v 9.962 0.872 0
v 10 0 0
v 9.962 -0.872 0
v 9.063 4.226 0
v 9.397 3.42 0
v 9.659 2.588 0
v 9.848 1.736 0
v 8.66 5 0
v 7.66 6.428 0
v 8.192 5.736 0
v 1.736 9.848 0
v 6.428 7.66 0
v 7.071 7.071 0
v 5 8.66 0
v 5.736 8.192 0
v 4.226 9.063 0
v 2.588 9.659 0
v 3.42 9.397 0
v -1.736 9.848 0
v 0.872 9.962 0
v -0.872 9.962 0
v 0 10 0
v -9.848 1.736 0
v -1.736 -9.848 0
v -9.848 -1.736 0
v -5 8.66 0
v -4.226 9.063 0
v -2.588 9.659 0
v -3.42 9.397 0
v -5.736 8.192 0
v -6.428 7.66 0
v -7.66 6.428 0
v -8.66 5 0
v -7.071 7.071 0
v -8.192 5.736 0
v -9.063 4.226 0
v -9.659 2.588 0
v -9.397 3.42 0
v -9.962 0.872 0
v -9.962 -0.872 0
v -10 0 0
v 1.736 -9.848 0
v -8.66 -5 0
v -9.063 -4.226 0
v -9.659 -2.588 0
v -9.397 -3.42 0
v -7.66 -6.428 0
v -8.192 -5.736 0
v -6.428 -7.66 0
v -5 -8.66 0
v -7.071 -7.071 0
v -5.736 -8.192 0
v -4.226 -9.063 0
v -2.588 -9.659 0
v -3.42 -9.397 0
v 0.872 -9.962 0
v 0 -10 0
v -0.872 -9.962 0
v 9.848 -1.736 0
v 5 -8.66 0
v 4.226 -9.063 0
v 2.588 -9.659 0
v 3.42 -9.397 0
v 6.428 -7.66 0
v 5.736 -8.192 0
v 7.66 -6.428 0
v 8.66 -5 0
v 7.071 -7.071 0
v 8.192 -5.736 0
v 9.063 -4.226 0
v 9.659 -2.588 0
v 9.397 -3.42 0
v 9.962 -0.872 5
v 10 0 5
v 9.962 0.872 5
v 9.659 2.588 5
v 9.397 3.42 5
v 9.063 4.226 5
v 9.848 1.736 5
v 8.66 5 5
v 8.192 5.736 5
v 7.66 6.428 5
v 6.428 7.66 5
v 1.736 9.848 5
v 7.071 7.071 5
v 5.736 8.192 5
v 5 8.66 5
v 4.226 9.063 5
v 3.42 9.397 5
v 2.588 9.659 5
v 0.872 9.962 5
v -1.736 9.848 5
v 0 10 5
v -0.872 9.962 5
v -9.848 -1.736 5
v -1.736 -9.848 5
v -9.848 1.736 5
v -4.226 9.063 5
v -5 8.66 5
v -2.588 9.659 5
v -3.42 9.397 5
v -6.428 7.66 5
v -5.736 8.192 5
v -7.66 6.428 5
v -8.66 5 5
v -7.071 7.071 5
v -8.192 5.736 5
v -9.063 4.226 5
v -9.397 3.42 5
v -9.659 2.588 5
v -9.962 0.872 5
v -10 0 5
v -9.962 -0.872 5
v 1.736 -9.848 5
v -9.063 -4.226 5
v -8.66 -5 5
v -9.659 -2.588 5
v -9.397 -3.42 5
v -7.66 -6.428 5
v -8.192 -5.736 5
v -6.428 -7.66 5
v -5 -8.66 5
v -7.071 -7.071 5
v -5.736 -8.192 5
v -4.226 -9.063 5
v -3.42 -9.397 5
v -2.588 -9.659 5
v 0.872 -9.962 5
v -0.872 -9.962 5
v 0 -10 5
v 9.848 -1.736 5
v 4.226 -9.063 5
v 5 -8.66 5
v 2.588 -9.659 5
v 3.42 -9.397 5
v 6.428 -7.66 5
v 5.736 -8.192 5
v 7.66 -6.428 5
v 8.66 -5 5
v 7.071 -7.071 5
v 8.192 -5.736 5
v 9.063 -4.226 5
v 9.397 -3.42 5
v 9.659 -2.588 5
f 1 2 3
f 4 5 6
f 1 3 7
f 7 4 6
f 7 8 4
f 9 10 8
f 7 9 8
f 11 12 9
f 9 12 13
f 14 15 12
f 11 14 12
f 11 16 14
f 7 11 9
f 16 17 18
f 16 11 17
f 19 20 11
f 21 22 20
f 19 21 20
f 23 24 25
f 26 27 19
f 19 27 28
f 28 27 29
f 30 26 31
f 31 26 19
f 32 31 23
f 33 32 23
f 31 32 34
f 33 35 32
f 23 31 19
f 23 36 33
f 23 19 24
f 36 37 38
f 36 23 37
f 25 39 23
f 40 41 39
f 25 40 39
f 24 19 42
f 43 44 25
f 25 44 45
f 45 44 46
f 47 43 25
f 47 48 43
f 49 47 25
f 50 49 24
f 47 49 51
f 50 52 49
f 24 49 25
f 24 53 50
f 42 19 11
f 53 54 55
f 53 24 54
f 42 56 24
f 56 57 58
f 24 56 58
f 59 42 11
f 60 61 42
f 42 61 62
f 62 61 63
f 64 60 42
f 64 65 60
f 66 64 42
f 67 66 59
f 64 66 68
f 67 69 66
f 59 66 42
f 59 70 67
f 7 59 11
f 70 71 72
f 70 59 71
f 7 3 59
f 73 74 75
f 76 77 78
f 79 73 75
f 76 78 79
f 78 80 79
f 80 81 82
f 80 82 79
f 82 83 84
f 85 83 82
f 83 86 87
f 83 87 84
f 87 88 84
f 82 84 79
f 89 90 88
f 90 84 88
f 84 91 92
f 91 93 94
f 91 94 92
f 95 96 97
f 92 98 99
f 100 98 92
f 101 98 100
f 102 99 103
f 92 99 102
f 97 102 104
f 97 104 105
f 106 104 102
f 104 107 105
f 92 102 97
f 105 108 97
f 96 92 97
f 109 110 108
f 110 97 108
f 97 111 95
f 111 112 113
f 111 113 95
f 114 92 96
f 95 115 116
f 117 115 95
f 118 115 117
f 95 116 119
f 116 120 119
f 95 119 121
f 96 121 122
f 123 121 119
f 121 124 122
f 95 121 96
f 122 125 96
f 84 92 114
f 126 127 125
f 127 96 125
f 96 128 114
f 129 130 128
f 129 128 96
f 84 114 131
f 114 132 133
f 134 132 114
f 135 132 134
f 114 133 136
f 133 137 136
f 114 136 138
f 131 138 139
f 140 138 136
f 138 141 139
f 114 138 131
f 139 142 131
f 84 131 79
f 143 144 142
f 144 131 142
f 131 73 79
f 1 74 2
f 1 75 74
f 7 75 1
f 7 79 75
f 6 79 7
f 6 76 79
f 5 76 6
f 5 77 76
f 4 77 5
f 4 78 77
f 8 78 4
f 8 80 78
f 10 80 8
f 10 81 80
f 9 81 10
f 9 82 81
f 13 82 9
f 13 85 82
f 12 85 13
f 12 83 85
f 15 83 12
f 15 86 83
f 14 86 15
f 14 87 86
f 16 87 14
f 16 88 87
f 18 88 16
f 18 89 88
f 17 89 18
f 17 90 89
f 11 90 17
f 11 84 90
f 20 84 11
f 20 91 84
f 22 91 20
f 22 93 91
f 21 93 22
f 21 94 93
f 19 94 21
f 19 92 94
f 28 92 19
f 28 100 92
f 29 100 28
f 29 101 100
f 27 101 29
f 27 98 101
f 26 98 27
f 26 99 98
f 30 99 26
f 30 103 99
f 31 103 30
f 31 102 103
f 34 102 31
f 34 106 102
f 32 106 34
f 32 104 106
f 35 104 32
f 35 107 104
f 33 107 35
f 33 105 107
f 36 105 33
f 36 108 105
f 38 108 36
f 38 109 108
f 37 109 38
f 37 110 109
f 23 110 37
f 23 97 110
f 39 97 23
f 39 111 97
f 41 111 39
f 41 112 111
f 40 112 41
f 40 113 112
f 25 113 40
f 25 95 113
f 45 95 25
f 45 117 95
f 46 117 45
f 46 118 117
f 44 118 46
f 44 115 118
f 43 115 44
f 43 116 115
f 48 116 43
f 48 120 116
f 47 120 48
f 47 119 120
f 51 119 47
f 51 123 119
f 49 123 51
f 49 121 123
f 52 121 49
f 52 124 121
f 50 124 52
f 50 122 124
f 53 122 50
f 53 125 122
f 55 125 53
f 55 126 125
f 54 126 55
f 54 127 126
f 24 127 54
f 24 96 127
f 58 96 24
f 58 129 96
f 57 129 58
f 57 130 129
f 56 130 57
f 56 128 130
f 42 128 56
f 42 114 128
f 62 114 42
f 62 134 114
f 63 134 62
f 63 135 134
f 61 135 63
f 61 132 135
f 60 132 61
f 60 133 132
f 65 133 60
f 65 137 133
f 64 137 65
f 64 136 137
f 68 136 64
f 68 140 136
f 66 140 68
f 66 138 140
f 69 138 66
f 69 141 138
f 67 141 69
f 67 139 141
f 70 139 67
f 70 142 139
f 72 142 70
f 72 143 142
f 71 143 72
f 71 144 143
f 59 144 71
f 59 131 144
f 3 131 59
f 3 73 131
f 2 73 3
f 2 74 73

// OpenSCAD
// Antarctic Gaming Co. prototype-only token shell, mm. No final sculpting implied.
// CLI example: openscad -o piece.stl -D 'shape="hex"' -D 'diameter=15' piece-base.scad
shape = is_undef(shape) ? "round" : shape;
diameter = is_undef(diameter) ? 20 : diameter;
height = is_undef(height) ? 5 : height;
$fn=72;
module outline() {
  if(shape=="hex") circle(d=diameter,$fn=6);
  else if(shape=="wedge") polygon([[0,diameter*.56],[diameter*.45,-diameter*.28],[diameter*.33,-diameter*.47],[-diameter*.33,-diameter*.47],[-diameter*.45,-diameter*.28]]);
  else circle(d=diameter);
}
linear_extrude(height=height) outline();
